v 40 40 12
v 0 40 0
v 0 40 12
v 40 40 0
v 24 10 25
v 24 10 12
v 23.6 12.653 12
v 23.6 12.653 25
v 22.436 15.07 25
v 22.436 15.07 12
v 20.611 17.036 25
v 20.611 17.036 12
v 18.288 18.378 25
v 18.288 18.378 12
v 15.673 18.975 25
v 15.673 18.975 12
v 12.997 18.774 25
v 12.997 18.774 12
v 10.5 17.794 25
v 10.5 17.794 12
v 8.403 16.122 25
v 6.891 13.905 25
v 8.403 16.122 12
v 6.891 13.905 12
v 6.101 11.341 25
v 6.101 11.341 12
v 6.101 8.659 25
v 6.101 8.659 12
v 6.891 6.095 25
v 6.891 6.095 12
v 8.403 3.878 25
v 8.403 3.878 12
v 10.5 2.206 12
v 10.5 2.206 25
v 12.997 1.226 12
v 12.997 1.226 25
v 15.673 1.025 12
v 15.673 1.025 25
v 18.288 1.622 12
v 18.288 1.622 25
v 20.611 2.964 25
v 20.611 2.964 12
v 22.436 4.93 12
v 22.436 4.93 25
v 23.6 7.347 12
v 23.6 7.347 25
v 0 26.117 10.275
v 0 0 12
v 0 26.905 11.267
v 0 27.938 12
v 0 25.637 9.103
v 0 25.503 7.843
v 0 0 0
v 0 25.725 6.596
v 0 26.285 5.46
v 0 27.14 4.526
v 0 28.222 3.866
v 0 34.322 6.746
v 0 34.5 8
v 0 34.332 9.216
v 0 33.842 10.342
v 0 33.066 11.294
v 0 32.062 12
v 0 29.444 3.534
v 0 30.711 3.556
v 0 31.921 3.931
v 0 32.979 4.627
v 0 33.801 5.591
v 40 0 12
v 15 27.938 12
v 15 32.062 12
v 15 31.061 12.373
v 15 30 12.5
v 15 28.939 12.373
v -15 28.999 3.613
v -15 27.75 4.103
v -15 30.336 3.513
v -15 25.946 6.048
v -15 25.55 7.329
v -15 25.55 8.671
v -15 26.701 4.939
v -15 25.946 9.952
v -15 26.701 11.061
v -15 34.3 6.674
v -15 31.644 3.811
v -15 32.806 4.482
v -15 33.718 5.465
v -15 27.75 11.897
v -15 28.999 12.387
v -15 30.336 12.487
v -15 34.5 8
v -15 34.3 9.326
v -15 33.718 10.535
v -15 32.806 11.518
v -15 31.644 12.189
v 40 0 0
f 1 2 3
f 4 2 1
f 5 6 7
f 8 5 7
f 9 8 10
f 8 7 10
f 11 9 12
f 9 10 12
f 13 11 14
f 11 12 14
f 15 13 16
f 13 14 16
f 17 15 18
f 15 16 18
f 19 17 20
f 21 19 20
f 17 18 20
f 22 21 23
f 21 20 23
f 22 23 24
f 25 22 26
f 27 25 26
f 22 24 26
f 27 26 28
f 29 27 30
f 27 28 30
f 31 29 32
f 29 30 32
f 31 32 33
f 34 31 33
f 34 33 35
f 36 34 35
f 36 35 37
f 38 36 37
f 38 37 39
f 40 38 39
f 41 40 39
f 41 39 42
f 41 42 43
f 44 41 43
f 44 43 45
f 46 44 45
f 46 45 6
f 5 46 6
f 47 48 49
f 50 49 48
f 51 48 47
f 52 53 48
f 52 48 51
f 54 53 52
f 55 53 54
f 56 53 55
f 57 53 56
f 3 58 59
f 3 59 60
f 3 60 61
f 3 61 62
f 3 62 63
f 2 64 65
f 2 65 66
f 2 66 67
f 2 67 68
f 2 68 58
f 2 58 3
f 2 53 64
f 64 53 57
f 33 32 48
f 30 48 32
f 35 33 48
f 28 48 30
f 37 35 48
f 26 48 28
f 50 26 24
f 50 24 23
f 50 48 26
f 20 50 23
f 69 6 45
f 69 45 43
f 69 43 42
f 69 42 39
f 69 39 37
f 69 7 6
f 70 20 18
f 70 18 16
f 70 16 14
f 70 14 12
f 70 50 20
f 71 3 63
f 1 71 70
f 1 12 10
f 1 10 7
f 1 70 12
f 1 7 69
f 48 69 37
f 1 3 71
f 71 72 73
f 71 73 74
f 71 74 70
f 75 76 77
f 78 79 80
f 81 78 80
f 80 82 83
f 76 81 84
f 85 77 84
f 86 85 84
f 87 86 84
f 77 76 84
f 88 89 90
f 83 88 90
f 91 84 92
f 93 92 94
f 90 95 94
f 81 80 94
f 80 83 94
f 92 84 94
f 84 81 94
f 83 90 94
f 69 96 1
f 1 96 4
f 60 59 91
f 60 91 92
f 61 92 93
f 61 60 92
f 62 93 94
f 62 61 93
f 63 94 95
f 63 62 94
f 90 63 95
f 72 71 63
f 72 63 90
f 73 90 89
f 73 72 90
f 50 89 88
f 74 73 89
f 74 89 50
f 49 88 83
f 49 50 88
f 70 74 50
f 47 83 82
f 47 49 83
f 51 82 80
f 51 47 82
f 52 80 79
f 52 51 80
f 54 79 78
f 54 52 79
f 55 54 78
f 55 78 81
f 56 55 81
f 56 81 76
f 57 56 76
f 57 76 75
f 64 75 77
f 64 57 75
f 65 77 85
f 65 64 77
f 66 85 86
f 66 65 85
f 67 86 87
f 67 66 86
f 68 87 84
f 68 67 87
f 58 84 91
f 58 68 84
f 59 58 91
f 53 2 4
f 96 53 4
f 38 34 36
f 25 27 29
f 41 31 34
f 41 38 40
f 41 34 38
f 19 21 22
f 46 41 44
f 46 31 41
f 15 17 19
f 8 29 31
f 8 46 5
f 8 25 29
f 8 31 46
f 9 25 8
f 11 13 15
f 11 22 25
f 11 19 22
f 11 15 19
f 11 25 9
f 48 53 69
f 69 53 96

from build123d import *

# Parameters (mm, degrees)
SKETCH_W     = 40
SKETCH_H     = 40
PAD_DEPTH    = 12
SKETCH001_R  = 9
PAD001_DEPTH = 25
SKETCH002_R  = 4.5
PAD002_DEPTH = 15


with BuildPart() as part:
    # Sketch → Pad (new body)
    with BuildSketch(Plane.XY):
        with Locations((20, 20)):
            Rectangle(SKETCH_W, SKETCH_H)
    extrude(amount=PAD_DEPTH)

    # Sketch001 → Pad001 (join)
    with BuildSketch(Plane.XY):
        with Locations((15, 10)):
            Circle(SKETCH001_R)
    extrude(amount=PAD001_DEPTH)

    # Sketch002 → Pad002 (join, symmetric)
    with BuildSketch(Plane.YZ):
        with Locations((30, 8)):
            Circle(SKETCH002_R)
    extrude(amount=PAD002_DEPTH, both=True)


solid = part.part
